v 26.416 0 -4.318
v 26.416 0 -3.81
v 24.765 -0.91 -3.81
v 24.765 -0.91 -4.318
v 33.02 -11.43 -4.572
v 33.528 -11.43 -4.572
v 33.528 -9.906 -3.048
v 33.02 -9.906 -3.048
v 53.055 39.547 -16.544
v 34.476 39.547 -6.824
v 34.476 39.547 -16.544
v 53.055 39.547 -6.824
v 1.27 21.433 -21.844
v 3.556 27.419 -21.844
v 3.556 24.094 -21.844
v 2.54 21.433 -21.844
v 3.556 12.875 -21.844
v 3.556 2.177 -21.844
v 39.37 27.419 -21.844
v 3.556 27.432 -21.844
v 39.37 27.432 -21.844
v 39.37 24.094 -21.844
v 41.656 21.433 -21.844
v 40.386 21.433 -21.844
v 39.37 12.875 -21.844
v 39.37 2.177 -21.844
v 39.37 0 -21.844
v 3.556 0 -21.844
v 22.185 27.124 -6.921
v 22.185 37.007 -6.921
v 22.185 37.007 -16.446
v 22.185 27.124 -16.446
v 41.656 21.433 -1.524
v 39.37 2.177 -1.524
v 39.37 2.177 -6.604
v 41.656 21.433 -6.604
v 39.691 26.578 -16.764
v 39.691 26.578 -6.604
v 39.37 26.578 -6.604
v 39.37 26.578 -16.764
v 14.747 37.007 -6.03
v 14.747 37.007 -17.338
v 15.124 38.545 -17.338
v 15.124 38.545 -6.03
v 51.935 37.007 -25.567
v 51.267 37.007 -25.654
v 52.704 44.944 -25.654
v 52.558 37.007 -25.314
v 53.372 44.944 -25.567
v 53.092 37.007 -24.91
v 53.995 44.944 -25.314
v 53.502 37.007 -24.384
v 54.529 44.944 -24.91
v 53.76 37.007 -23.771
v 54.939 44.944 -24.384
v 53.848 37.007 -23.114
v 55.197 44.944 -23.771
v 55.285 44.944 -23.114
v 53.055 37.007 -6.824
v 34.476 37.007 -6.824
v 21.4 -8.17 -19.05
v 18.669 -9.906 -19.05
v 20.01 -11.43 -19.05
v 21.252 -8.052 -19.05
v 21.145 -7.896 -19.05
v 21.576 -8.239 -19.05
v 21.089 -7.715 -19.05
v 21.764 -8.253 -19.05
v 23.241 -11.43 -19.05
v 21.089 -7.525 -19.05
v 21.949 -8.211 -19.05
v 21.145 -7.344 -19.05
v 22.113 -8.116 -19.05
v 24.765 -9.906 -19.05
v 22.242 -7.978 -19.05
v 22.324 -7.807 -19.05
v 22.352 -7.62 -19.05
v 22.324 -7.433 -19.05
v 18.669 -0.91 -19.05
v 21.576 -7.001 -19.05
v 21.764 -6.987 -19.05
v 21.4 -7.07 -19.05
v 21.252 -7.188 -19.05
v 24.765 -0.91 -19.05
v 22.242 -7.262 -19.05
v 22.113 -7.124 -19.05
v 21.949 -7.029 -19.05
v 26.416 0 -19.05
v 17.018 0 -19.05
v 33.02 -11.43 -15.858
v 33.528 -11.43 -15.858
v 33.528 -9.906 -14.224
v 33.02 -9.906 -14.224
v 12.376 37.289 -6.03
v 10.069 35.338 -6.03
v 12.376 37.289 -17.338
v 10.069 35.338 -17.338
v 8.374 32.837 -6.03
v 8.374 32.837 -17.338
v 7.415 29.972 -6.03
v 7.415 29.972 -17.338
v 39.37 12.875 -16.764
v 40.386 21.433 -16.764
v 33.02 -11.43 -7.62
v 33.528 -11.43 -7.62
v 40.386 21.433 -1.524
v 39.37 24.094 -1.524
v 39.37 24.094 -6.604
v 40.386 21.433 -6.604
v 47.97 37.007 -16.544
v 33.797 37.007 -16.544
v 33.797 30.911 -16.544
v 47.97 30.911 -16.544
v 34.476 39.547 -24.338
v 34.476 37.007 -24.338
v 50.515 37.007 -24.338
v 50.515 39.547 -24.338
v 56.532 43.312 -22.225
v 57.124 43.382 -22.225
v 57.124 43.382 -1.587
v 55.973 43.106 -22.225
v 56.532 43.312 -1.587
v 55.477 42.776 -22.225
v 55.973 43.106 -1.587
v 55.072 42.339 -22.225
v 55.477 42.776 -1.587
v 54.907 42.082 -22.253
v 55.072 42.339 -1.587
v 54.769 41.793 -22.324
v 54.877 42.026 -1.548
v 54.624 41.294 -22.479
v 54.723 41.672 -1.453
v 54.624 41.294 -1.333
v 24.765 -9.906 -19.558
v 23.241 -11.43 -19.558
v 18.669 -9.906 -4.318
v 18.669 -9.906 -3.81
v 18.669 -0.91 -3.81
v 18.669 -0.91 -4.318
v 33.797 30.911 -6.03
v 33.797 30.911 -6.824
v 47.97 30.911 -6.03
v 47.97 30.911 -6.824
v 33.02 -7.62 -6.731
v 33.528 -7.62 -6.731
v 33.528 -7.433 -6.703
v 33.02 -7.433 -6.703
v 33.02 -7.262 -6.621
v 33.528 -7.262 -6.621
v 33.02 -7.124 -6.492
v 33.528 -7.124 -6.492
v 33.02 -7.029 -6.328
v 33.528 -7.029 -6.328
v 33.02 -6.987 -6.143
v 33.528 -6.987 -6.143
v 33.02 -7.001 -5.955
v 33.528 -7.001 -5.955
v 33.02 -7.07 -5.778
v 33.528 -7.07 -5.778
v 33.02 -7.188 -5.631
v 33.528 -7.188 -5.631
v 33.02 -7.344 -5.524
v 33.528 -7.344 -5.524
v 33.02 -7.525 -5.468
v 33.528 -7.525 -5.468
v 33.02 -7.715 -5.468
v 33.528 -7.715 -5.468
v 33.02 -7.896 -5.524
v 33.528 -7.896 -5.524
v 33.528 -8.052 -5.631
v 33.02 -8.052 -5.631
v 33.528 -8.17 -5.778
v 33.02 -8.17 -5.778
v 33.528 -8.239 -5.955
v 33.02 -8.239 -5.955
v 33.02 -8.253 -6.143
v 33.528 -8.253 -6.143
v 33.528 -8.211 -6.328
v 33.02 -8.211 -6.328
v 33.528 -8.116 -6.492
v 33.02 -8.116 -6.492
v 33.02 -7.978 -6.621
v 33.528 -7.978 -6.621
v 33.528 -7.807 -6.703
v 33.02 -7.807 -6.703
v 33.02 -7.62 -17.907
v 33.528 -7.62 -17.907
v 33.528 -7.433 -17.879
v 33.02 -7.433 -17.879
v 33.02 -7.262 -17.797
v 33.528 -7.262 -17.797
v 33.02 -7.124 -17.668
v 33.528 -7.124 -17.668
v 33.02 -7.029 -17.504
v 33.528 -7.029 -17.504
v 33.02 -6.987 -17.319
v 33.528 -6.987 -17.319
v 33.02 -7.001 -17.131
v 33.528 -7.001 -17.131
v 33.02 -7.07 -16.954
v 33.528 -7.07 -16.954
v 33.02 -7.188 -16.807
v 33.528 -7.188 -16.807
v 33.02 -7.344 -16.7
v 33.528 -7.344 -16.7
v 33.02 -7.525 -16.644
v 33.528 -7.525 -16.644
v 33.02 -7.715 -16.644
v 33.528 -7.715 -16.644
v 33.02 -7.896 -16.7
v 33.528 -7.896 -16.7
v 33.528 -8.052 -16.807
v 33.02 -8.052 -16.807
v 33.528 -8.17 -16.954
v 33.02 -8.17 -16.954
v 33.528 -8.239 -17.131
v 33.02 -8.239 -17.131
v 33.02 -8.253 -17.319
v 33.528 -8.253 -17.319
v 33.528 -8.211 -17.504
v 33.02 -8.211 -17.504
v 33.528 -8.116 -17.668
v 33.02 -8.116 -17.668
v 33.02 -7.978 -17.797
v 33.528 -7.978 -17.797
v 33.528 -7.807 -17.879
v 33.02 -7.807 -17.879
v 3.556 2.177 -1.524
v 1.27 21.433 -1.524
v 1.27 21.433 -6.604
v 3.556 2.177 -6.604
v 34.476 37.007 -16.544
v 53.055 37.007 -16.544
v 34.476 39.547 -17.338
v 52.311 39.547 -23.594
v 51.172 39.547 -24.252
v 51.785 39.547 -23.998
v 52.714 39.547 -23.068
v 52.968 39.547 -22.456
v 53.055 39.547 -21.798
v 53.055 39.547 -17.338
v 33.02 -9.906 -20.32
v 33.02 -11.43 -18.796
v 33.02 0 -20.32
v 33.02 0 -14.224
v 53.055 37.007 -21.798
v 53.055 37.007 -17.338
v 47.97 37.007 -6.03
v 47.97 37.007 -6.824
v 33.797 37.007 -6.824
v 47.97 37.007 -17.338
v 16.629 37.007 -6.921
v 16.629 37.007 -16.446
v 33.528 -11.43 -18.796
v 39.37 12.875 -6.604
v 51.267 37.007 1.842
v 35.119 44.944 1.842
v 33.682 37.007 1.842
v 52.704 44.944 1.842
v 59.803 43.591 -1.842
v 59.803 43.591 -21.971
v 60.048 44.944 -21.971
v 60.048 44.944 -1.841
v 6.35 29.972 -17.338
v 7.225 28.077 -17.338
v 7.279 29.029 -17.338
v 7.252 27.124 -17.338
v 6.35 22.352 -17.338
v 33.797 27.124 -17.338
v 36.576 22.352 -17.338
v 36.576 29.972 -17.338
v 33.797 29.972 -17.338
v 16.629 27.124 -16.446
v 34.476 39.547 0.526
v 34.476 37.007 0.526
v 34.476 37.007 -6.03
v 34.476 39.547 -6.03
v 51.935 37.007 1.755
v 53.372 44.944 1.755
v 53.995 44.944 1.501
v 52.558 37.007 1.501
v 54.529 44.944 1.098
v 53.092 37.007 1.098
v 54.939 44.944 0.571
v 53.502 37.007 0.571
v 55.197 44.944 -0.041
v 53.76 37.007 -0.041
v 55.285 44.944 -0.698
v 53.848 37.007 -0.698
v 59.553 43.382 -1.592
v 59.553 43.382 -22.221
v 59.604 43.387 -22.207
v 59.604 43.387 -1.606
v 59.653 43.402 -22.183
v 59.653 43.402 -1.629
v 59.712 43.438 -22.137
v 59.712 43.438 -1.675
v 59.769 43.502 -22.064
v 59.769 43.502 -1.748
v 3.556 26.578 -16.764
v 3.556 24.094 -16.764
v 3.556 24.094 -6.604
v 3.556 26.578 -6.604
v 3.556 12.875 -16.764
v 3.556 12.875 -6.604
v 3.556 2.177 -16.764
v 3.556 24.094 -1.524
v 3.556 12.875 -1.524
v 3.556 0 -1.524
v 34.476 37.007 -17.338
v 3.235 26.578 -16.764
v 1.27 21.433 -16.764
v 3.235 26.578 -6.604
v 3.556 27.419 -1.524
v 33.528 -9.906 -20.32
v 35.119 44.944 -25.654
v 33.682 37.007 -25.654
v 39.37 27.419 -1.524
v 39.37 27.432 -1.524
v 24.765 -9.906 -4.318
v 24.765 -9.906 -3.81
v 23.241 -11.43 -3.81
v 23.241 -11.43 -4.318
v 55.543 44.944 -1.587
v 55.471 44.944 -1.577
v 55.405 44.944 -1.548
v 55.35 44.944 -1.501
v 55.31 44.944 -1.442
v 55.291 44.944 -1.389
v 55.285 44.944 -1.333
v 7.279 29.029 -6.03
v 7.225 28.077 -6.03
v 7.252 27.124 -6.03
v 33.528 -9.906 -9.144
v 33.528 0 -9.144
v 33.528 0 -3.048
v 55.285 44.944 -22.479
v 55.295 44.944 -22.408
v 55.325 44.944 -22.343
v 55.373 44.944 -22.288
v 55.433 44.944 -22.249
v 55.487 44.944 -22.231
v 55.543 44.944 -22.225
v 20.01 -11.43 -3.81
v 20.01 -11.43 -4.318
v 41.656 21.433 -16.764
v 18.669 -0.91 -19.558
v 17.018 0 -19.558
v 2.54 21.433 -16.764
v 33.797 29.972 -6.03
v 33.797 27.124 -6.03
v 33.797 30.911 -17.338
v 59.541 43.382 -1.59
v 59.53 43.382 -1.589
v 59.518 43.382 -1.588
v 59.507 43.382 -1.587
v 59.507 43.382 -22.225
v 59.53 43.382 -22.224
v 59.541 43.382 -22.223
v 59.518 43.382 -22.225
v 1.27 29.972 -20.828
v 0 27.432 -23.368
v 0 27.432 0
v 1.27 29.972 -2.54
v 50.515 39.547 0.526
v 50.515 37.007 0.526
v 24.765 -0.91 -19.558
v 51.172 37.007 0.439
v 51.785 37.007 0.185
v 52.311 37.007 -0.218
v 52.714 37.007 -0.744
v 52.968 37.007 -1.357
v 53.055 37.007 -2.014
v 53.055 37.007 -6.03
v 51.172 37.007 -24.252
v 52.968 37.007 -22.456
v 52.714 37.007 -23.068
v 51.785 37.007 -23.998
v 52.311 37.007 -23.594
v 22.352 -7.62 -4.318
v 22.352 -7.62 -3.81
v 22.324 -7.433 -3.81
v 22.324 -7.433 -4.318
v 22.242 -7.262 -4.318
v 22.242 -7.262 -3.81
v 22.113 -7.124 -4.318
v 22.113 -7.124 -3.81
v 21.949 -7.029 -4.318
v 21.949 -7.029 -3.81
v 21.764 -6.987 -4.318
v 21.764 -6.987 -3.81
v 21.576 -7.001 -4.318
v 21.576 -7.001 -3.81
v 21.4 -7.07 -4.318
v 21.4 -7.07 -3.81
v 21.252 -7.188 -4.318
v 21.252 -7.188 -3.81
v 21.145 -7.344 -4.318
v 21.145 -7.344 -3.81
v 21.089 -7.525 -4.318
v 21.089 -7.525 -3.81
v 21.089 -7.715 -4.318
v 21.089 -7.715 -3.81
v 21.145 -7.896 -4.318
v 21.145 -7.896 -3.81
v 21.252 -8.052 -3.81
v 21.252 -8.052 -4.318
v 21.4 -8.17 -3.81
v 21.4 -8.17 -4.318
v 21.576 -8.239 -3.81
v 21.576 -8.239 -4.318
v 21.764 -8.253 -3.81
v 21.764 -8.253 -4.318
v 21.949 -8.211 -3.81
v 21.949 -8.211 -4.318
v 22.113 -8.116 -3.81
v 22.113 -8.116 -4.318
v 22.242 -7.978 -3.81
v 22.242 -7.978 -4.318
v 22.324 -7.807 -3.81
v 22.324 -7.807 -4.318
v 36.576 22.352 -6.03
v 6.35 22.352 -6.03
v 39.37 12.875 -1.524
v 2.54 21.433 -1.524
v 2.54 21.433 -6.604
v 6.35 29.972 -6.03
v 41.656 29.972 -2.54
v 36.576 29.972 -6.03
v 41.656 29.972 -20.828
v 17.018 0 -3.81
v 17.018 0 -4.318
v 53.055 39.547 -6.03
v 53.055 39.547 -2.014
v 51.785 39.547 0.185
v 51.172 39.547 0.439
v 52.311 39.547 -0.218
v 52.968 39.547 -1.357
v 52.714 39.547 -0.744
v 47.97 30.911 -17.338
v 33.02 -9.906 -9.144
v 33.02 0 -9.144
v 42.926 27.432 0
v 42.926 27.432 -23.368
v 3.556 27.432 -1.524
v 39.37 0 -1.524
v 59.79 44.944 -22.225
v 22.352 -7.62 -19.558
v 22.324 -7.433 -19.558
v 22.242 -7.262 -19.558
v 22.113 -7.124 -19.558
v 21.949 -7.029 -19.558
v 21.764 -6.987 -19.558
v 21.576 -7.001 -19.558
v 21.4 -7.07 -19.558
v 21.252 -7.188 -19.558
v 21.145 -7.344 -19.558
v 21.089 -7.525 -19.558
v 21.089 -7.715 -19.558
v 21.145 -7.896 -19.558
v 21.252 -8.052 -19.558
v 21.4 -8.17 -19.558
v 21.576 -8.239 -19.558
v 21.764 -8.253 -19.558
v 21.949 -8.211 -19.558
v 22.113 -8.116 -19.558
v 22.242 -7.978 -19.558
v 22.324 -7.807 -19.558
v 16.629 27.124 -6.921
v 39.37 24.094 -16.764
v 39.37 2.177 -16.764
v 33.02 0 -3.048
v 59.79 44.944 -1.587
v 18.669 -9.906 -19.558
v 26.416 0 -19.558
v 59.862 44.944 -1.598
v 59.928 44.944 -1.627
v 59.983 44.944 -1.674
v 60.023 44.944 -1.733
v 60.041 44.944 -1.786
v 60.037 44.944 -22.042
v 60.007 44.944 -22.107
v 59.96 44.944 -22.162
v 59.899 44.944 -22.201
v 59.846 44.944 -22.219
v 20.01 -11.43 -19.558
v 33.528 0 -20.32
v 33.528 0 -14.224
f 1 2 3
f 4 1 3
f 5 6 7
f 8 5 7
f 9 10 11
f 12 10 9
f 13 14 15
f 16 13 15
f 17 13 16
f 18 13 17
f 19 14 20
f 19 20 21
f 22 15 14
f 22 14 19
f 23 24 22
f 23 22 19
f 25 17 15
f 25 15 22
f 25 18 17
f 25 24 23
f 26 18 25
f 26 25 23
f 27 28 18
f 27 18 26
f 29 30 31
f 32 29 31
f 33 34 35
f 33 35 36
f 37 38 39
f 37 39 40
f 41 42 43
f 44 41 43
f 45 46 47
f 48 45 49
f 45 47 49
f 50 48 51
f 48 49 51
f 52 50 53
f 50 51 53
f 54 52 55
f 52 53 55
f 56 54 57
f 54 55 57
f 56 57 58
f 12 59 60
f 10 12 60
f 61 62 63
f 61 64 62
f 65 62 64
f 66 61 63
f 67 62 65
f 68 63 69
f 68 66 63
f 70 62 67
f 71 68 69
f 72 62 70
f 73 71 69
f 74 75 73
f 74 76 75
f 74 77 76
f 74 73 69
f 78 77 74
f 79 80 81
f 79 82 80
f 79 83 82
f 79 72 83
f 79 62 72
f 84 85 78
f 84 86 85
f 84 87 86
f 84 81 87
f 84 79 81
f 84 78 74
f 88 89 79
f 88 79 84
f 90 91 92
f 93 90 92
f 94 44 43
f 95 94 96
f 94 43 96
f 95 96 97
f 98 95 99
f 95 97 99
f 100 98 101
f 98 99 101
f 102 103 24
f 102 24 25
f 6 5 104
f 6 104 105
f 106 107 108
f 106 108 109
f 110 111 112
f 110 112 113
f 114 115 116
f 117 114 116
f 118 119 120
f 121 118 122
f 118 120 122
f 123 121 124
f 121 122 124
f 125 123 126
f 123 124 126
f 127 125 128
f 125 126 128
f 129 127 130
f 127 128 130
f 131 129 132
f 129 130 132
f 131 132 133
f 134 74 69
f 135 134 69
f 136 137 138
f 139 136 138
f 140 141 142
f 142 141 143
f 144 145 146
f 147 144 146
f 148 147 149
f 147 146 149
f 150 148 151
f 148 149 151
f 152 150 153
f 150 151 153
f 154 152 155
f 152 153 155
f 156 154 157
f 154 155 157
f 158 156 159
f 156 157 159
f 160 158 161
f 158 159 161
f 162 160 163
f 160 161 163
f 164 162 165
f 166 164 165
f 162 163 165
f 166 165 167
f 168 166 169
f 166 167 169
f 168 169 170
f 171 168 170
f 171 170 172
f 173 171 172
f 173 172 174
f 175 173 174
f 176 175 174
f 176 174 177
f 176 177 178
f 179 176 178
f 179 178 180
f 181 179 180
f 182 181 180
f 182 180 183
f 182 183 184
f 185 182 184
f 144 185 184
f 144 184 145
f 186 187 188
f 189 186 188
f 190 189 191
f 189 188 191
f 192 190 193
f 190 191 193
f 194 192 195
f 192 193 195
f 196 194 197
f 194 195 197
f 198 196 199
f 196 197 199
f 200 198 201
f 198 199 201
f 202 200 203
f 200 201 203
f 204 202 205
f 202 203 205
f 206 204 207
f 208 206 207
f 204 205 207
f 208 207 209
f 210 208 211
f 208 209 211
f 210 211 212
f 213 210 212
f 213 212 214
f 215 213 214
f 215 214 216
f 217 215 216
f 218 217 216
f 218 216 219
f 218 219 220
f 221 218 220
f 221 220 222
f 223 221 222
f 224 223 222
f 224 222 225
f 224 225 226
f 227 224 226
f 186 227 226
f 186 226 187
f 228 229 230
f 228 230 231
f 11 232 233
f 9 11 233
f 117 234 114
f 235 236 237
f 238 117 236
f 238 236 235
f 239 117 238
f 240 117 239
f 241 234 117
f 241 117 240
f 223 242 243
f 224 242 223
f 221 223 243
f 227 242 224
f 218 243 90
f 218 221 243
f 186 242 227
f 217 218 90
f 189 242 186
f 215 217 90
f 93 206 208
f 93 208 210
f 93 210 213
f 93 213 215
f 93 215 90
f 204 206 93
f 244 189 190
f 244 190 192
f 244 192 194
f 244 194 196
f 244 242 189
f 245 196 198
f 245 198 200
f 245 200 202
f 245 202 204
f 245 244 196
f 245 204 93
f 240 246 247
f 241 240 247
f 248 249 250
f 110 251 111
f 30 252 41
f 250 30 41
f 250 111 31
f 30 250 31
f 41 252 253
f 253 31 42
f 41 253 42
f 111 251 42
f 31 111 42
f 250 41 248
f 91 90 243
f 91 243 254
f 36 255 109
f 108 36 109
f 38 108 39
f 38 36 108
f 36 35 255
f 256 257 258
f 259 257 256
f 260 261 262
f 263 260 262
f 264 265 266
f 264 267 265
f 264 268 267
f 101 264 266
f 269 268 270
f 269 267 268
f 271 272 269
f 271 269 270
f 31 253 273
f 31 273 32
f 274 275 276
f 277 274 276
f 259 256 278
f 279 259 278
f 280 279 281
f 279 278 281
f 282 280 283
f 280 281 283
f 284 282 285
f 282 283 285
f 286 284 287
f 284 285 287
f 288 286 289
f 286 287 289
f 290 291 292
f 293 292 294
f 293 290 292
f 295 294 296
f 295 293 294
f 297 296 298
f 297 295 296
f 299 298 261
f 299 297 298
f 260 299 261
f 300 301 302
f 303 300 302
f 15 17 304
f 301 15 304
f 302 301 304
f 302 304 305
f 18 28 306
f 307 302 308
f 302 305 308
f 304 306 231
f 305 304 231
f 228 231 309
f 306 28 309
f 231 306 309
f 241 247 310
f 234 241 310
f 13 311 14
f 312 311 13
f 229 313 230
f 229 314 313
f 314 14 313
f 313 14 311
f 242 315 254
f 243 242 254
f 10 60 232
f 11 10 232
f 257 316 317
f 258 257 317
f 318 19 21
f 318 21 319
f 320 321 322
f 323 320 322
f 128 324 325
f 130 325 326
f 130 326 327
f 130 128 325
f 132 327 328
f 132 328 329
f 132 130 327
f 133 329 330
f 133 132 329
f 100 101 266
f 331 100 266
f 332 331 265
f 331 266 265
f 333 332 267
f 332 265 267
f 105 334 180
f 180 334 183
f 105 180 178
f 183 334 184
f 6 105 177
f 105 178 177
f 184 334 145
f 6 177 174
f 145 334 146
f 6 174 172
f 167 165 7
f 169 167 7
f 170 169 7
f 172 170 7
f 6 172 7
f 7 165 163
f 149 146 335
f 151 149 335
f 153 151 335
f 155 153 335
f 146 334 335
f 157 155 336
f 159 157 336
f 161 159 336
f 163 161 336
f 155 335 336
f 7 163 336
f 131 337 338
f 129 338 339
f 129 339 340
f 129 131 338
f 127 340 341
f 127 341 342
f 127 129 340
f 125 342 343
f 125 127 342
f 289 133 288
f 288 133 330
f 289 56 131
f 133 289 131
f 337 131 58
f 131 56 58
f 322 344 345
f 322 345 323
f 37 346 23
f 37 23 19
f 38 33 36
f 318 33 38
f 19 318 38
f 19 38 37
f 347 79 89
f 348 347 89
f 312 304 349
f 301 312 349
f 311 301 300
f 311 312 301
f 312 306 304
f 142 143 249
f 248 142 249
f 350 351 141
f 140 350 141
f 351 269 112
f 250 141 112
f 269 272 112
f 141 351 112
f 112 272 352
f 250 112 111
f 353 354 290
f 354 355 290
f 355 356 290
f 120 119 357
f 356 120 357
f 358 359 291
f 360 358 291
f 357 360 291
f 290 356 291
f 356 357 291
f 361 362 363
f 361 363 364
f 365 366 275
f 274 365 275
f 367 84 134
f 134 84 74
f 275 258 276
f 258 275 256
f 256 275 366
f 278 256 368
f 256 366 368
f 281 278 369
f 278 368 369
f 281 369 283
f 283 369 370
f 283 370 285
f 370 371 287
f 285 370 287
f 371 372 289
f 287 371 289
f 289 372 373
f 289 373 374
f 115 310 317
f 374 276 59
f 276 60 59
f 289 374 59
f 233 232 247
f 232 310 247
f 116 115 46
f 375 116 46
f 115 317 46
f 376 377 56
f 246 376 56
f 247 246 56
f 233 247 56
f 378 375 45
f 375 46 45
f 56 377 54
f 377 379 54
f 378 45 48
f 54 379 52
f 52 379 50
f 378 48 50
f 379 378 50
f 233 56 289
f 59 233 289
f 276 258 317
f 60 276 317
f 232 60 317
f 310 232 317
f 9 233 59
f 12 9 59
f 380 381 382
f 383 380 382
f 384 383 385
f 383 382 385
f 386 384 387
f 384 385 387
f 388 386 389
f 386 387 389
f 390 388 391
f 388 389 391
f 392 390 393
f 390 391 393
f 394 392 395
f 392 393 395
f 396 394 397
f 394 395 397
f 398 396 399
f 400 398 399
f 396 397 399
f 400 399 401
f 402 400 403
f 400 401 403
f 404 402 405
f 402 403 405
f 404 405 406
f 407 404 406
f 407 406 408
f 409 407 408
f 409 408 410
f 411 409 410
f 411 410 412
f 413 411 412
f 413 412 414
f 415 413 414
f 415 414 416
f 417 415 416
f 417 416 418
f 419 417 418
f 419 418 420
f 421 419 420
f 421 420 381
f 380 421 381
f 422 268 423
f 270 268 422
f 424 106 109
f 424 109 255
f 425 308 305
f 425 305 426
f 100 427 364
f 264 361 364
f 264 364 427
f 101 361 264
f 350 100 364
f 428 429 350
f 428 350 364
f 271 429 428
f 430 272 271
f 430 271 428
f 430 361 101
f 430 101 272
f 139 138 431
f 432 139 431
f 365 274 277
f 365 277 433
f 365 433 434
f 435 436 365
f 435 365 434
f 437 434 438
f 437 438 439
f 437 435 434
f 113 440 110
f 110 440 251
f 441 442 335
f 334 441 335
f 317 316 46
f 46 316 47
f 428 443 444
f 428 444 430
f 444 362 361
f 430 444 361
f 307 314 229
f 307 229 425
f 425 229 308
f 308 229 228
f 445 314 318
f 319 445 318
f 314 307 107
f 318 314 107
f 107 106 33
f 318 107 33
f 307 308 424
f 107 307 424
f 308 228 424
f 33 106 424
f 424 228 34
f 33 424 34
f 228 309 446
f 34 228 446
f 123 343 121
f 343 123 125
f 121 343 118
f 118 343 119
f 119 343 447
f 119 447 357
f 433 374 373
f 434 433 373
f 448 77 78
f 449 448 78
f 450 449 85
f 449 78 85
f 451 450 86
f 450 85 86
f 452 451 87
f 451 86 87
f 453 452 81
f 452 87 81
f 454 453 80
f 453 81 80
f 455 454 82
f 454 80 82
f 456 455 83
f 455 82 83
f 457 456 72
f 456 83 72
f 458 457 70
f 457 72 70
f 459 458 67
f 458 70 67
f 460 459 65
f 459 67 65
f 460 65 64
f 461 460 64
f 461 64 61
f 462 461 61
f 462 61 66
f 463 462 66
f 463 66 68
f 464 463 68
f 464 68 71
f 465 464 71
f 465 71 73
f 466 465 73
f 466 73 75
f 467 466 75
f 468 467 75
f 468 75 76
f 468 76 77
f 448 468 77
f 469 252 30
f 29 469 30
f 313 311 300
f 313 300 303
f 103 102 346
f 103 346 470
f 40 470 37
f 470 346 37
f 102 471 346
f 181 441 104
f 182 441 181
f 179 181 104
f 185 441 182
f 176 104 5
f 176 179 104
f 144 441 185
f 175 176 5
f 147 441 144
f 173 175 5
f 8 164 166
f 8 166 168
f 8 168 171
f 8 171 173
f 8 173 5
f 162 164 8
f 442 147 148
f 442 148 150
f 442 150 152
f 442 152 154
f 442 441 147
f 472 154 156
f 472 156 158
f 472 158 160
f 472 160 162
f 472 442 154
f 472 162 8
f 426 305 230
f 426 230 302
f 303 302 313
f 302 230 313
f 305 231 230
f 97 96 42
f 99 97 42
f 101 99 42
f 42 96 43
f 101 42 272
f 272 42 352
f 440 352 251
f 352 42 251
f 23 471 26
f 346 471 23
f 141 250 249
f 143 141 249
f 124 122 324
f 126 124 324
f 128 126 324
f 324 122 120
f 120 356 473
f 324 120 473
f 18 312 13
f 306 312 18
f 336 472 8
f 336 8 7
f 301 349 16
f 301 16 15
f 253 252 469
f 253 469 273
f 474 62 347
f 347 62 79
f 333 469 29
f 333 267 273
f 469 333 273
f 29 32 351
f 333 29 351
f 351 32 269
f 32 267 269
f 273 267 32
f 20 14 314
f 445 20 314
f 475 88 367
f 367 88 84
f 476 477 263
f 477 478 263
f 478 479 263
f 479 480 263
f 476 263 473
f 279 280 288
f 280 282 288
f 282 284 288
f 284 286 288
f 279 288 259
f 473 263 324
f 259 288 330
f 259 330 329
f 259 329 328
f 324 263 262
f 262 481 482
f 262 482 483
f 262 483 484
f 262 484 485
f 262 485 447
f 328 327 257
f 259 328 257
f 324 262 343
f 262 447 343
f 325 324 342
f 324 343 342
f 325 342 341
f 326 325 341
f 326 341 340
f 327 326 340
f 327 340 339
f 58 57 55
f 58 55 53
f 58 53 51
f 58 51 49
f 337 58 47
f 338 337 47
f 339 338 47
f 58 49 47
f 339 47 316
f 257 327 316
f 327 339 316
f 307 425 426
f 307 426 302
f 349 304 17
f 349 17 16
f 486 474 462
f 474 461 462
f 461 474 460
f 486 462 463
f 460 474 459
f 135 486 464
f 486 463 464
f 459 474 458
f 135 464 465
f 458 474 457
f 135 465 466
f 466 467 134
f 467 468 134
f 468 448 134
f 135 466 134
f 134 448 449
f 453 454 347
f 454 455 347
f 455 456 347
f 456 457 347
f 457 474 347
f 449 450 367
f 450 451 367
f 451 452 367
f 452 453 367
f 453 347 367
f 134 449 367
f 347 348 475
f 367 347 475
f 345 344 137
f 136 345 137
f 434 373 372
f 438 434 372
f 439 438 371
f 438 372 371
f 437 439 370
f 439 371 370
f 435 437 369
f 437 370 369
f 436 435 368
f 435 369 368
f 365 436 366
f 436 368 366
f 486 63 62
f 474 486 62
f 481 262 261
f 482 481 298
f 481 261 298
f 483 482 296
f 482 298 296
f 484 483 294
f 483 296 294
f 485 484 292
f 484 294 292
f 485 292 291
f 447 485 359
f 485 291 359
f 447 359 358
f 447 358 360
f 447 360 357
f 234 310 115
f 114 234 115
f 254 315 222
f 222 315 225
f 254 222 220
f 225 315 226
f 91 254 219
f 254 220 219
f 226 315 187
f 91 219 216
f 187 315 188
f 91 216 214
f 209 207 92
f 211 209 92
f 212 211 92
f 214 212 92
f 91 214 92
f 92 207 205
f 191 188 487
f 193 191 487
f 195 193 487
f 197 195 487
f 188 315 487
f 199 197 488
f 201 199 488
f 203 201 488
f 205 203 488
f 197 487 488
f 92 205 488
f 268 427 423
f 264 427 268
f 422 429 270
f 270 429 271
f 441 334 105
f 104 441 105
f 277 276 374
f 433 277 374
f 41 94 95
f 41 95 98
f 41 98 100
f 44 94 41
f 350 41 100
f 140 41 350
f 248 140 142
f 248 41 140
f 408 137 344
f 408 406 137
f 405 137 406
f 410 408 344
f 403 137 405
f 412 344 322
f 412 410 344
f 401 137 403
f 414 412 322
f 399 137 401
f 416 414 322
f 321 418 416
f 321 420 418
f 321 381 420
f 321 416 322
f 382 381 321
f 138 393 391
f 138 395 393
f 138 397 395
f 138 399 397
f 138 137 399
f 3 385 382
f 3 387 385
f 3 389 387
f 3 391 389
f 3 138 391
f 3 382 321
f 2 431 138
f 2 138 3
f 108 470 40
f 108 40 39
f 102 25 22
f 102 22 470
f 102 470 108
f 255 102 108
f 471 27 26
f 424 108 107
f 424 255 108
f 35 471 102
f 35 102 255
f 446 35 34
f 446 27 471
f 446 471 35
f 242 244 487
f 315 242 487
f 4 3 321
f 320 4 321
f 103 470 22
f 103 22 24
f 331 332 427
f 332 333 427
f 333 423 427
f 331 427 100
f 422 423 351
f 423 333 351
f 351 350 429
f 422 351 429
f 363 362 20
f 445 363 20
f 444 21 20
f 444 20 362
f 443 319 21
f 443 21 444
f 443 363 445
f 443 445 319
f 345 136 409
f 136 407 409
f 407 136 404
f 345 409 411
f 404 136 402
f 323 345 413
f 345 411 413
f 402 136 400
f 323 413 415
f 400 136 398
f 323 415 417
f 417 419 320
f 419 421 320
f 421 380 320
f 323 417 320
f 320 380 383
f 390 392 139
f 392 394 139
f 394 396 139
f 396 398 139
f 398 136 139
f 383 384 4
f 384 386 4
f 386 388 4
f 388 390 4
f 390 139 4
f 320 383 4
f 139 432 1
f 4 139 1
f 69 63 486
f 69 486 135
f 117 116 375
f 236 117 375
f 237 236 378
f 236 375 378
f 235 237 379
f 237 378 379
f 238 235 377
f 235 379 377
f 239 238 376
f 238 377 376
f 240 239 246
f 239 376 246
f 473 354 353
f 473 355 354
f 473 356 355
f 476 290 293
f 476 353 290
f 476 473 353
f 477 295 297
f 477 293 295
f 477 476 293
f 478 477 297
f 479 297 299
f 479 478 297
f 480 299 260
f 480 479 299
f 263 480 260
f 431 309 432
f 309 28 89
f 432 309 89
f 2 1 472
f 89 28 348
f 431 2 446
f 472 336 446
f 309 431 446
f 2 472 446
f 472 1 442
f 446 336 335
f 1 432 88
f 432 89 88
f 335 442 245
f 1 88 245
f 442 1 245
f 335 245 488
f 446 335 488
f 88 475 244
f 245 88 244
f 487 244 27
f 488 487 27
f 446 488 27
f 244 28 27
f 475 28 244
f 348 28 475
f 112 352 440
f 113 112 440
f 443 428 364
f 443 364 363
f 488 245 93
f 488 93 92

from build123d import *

# Parameters (mm, degrees)
SKETCH1_W                = 42.926
SKETCH1_H                = 23.368
BOSS_EXTRUDE1_DEPTH      = 29.972
SKETCH2_W                = 42.926
SKETCH2_H                = 23.368
SKETCH2_W_2              = 35.814
SKETCH2_H_2              = 20.32
CUT_EXTRUDE1_DEPTH       = 27.432
CUT_EXTRUDE3_DEPTH       = 58.332588325
CUT_EXTRUDE4_DEPTH       = 58.332588325
SKETCH6_W                = 30.226
SKETCH6_H                = 11.308118352
CUT_EXTRUDE5_DEPTH       = 7.62
BOSS_EXTRUDE2_DEPTH      = 20.32
SKETCH9_W                = 9.398
SKETCH9_H                = 0.508
SKETCH9_W_2              = 0.508
SKETCH9_H_2              = 6.096
BOSS_EXTRUDE3_DEPTH      = 11.43
CUT_EXTRUDE6_REACH       = 52.68
SKETCH10_R               = 0.635
SKETCH11_R               = 0.635
CUT_EXTRUDE7_DEPTH       = 56.888081234
BOSS_EXTRUDE7_DEPTH      = 11.308118351
CUT_EXTRUDE8_REACH       = 74.758
SKETCH13_W               = 10.16
SKETCH13_H               = 24.400758564
SKETCH14_W               = 10.16
SKETCH14_H               = 24.400758564
CUT_EXTRUDE9_DEPTH       = 12.7
BOSS_EXTRUDE8_DEPTH      = 1.8415
BOSS_EXTRUDE8_DEPTH_BACK = 25.654
SKETCH17_W               = 3.429
SKETCH17_H               = 2.254926229
SKETCH17_H_2             = 1.5875
CUT_EXTRUDE11_DEPTH      = 4.686333783
FILLET2_R                = 2.54
FILLET3_R                = 2.54
FILLET6_R                = 0.254
CUT_EXTRUDE12_START      = -6.096
CUT_EXTRUDE12_OUTLINE_W  = 14.172661673
CUT_EXTRUDE12_OUTLINE_H  = 9.720618352
CUT_EXTRUDE12_DEPTH      = 6.096
CUT_EXTRUDE13_DEPTH      = 2.54
SKETCH20_W               = 5.55625
SKETCH20_H               = 9.525
CUT_EXTRUDE14_DEPTH      = 12.7


# Read off the part's stored shape, not the designer's step: Cut-Extrude12
with BuildPart() as part:
    # Sketch1 → Boss-Extrude1 (new body)
    with BuildSketch(Plane(origin=(0, 0, 0), x_dir=(1, 0, 0), z_dir=(0, 1, 0))):
        with Locations((21.463, 11.684)):
            Rectangle(SKETCH1_W, SKETCH1_H)
    extrude(amount=BOSS_EXTRUDE1_DEPTH)

    # Sketch2 → Cut-Extrude1 (cut)
    with BuildSketch(Plane.XZ):
        with Locations((21.463, -11.684)):
            Rectangle(SKETCH2_W, SKETCH2_H)
        with Locations((21.463, -11.684)):
            Rectangle(SKETCH2_W_2, SKETCH2_H_2, mode=Mode.SUBTRACT)
    extrude(amount=-CUT_EXTRUDE1_DEPTH, mode=Mode.SUBTRACT)

    # Sketch5 → Cut-Extrude3 (cut, through all)
    with BuildSketch(Plane.XY):
        Polygon((0, 29.972), (0, 27.432), (1.27, 29.972), align=None)
        Polygon((42.926, 29.972), (42.926, 27.432), (41.656, 29.972), align=None)
    extrude(amount=-CUT_EXTRUDE3_DEPTH, mode=Mode.SUBTRACT)

    # Sketch3 → Cut-Extrude4 (cut, through all)
    with BuildSketch(Plane.ZY):
        Polygon((-23.368, 27.432), (-20.828, 29.972), (-23.368, 29.972), align=None)
        Polygon((0, 27.432), (0, 29.972), (-2.54, 29.972), align=None)
    extrude(amount=-CUT_EXTRUDE4_DEPTH, mode=Mode.SUBTRACT)

    # Sketch6 → Cut-Extrude5 (cut)
    with BuildSketch(Plane(origin=(0, 29.972, 0), x_dir=(1, 0, 0), z_dir=(0, 1, 0))):
        with Locations((21.463, 11.684)):
            Rectangle(SKETCH6_W, SKETCH6_H)
    extrude(amount=-CUT_EXTRUDE5_DEPTH, mode=Mode.SUBTRACT)

    # Sketch7 → Boss-Extrude2 (add)
    with BuildSketch(Plane.XY.offset(-1.524)):
        Polygon((3.556, 12.874989672), (2.54, 21.433276772), (1.27, 21.433276772), (3.556, 2.177130797), align=None)
        Polygon((2.54, 21.433276772), (3.556, 24.093595202), (3.556, 27.418993238), (1.27, 21.433276772), align=None)
        Polygon((39.37, 2.177130797), (41.656, 21.433276772), (40.386, 21.433276772), (39.37, 12.874989672), align=None)
        Polygon((41.656, 21.433276772), (39.37, 27.418993238), (39.37, 24.093595202), (40.386, 21.433276772), align=None)
    extrude(amount=-BOSS_EXTRUDE2_DEPTH)

    # Sketch9 → Boss-Extrude3 (add)
    with BuildSketch(Plane.XZ):
        with Locations((21.717, -19.304)):
            Rectangle(SKETCH9_W, SKETCH9_H)
        with Locations((21.717, -4.064)):
            Rectangle(SKETCH9_W, SKETCH9_H)
        with Locations((33.274, -6.096)):
            Rectangle(SKETCH9_W_2, SKETCH9_H_2)
        with Locations((33.274, -17.272)):
            Rectangle(SKETCH9_W_2, SKETCH9_H_2)
    extrude(amount=BOSS_EXTRUDE3_DEPTH)

    # Sketch10 → Cut-Extrude6 (cut, up to next)
    with BuildSketch(Plane(origin=(33.528, 0, 0), x_dir=(0, 0, -1), z_dir=(1, 0, 0)), mode=Mode.PRIVATE) as cut_extrude6_sk1:
        Polygon((18.796, -11.43), (20.32, -11.43), (20.32, -9.906), align=None)
    cut_extrude6_tool1 = extrude(cut_extrude6_sk1.sketch, amount=-CUT_EXTRUDE6_REACH, mode=Mode.PRIVATE) & part.part
    # Sketch10 → Cut-Extrude6 (cut, up to next)
    with BuildSketch(Plane(origin=(33.528, 0, 0), x_dir=(0, 0, -1), z_dir=(1, 0, 0)), mode=Mode.PRIVATE) as cut_extrude6_sk2:
        Polygon((14.224, -9.906), (14.224, -11.43), (15.857916608, -11.43), align=None)
    cut_extrude6_tool2 = extrude(cut_extrude6_sk2.sketch, amount=-CUT_EXTRUDE6_REACH, mode=Mode.PRIVATE) & part.part
    # Sketch10 → Cut-Extrude6 (cut, up to next)
    with BuildSketch(Plane(origin=(33.528, 0, 0), x_dir=(0, 0, -1), z_dir=(1, 0, 0)), mode=Mode.PRIVATE) as cut_extrude6_sk3:
        Polygon((3.048, -9.906), (3.048, -11.43), (4.572, -11.43), align=None)
    cut_extrude6_tool3 = extrude(cut_extrude6_sk3.sketch, amount=-CUT_EXTRUDE6_REACH, mode=Mode.PRIVATE) & part.part
    # Sketch10 → Cut-Extrude6 (cut, up to next)
    with BuildSketch(Plane(origin=(33.528, 0, 0), x_dir=(0, 0, -1), z_dir=(1, 0, 0)), mode=Mode.PRIVATE) as cut_extrude6_sk4:
        Polygon((7.62, -11.43), (9.144, -11.43), (9.144, -9.906), align=None)
    cut_extrude6_tool4 = extrude(cut_extrude6_sk4.sketch, amount=-CUT_EXTRUDE6_REACH, mode=Mode.PRIVATE) & part.part
    # Sketch10 → Cut-Extrude6 (cut, up to next)
    with BuildSketch(Plane(origin=(33.528, 0, 0), x_dir=(0, 0, -1), z_dir=(1, 0, 0)), mode=Mode.PRIVATE) as cut_extrude6_sk5:
        with Locations((6.096, -7.62)):
            Circle(SKETCH10_R)
    cut_extrude6_tool5 = extrude(cut_extrude6_sk5.sketch, amount=-CUT_EXTRUDE6_REACH, mode=Mode.PRIVATE) & part.part
    # Sketch10 → Cut-Extrude6 (cut, up to next)
    with BuildSketch(Plane(origin=(33.528, 0, 0), x_dir=(0, 0, -1), z_dir=(1, 0, 0)), mode=Mode.PRIVATE) as cut_extrude6_sk6:
        with Locations((17.272, -7.62)):
            Circle(SKETCH10_R)
    cut_extrude6_tool6 = extrude(cut_extrude6_sk6.sketch, amount=-CUT_EXTRUDE6_REACH, mode=Mode.PRIVATE) & part.part
    add(cut_extrude6_tool1.solids().sort_by_distance((33.528, -10.922, -19.812))[0], mode=Mode.SUBTRACT)
    add(cut_extrude6_tool2.solids().sort_by_distance((33.528, -10.922, -14.768639))[0], mode=Mode.SUBTRACT)
    add(cut_extrude6_tool3.solids().sort_by_distance((33.528, -10.922, -3.556))[0], mode=Mode.SUBTRACT)
    add(cut_extrude6_tool4.solids().sort_by_distance((33.528, -10.922, -8.636))[0], mode=Mode.SUBTRACT)
    add(cut_extrude6_tool5.solids().sort_by_distance((33.528, -7.62, -6.096))[0], mode=Mode.SUBTRACT)
    add(cut_extrude6_tool6.solids().sort_by_distance((33.528, -7.62, -17.272))[0], mode=Mode.SUBTRACT)

    # Sketch11 → Cut-Extrude7 (cut, through all)
    with BuildSketch(Plane.XY.offset(-3.81)):
        Polygon((18.669, -0.909958284), (17.018, 0), (17.018, -11.43), (20.009868608, -11.43), (18.669, -9.906), align=None)
        with Locations((21.717, -7.62)):
            Circle(SKETCH11_R)
        Polygon((26.416, 0), (24.765, -0.909958284), (24.765, -9.906), (23.241, -11.43), (26.416, -11.43), align=None)
    extrude(amount=-CUT_EXTRUDE7_DEPTH, mode=Mode.SUBTRACT)

    # Sketch12 → Boss-Extrude7 (add)
    with BuildSketch(Plane.XY.offset(-17.338059176)):
        with BuildLine():
            Line((33.796840653, 30.910566615), (47.969502326, 30.910566615))
            Line((47.969502326, 30.910566615), (47.969502326, 37.006566615))
            Line((47.969502326, 37.006566615), (14.747400659, 37.006566615))
            Line((14.747400659, 37.006566615), (15.124125013, 38.544832274))
            ThreePointArc((15.124125013, 38.544832274), (10.069226718, 35.337937954), (7.415384629, 29.972))
            Line((7.415384629, 29.972), (33.796840653, 29.972))
            Line((33.796840653, 29.972), (33.796840653, 30.910566615))
        make_face()
        with BuildLine():
            Line((33.796840653, 27.124411179), (33.796840653, 29.972))
            Line((33.796840653, 29.972), (7.415384629, 29.972))
            ThreePointArc((7.415384629, 29.972), (7.241769578, 28.553480232), (7.251876855, 27.124411179))
            Line((7.251876855, 27.124411179), (33.796840653, 27.124411179))
        make_face()
    extrude(amount=BOSS_EXTRUDE7_DEPTH)

    # Cut-Extrude8: up to this face of the body (flat: up to its plane)
    cut_extrude8_end = Plane(part.part.faces().sort_by_distance((3.556, 1.088565398, -11.684))[0])
    # Sketch13 → Cut-Extrude8 (cut, up to the picked face)
    with BuildSketch(Plane.ZY.offset(9.144), mode=Mode.PRIVATE) as cut_extrude8_sk1:
        with Locations((-11.684, 14.377510079)):
            Rectangle(SKETCH13_W, SKETCH13_H)
    cut_extrude8_tool1 = split(extrude(cut_extrude8_sk1.sketch, amount=-CUT_EXTRUDE8_REACH, mode=Mode.PRIVATE), bisect_by=cut_extrude8_end, keep=Keep.BOTH, mode=Mode.PRIVATE)
    add(cut_extrude8_tool1.solids().sort_by(Axis((-9.144, 14.37751, -11.684), (1, 0, 0)))[0], mode=Mode.SUBTRACT)

    # Sketch14 → Cut-Extrude9 (cut)
    with BuildSketch(Plane(origin=(52.07, 0, 0), x_dir=(0, 0, -1), z_dir=(1, 0, 0))):
        with Locations((11.684, 14.377510079)):
            Rectangle(SKETCH14_W, SKETCH14_H)
    extrude(amount=-CUT_EXTRUDE9_DEPTH, mode=Mode.SUBTRACT)

    # Cut-Extrude12 outline → Cut-Extrude12 (cut)
    with BuildSketch(Plane.XZ.offset(-30.910566615).offset(CUT_EXTRUDE12_START)):
        with Locations((40.88317149, -11.684)):
            Rectangle(CUT_EXTRUDE12_OUTLINE_W, CUT_EXTRUDE12_OUTLINE_H)
    extrude(amount=CUT_EXTRUDE12_DEPTH, mode=Mode.SUBTRACT)

    # Sketch20 → Cut-Extrude14 (cut)
    with BuildSketch(Plane(origin=(0, 37.006566615, 0), x_dir=(1, 0, 0), z_dir=(0, 1, 0))):
        with Locations((19.406889706, 11.684)):
            Rectangle(SKETCH20_W, SKETCH20_H)
    extrude(amount=-CUT_EXTRUDE14_DEPTH, mode=Mode.SUBTRACT)


with BuildPart() as body_2:
    # Sketch15 → Boss-Extrude8 (new, two sides: drawn at the far end of the back side and taken through both)
    with BuildSketch(Plane.XY.offset(-BOSS_EXTRUDE8_DEPTH_BACK)):
        Polygon((33.682002326, 37.006566615), (47.969502326, 37.006566615), (53.848269551, 37.006566615), (55.002370372, 43.381955354), (55.285150601, 44.944066615), (35.118883377, 44.944066615), align=None)
        Polygon((55.285150601, 44.944066615), (55.002370372, 43.381955354), (59.764870372, 43.381955354), (60.047650601, 44.944066615), align=None)
    extrude(amount=BOSS_EXTRUDE8_DEPTH + BOSS_EXTRUDE8_DEPTH_BACK)

    # Sketch17 → Cut-Extrude11 (cut)
    with BuildSketch(Plane(origin=(50.264518988, -9.099103601, 0), x_dir=(0, 0, -1), z_dir=(0.9840070935891015, -0.17812927824007313, 0))):
        with Locations((-0.127, 52.206561912)):
            Rectangle(SKETCH17_W, SKETCH17_H)
        with Locations((-0.127, 54.127775026)):
            Rectangle(SKETCH17_W, SKETCH17_H_2)
        with Locations((23.9395, 52.206561912)):
            Rectangle(SKETCH17_W, SKETCH17_H)
        with Locations((23.9395, 54.127775026)):
            Rectangle(SKETCH17_W, SKETCH17_H_2)
    extrude(amount=-CUT_EXTRUDE11_DEPTH, mode=Mode.SUBTRACT)

    # Fillet2
    fillet2_edges = [body_2.edges().sort_by_distance(p)[0] for p in [
        (54.425319961, 40.194260985, 1.8415),
        (54.425319961, 40.194260985, -25.654),
    ]]
    fillet(fillet2_edges, radius=FILLET2_R)

    # Fillet3
    fillet3_edges = [body_2.edges().sort_by_distance(p)[0] for p in [
        (55.002370372, 43.381955354, -11.90625),
    ]]
    fillet(fillet3_edges, radius=FILLET3_R)

    # Fillet6
    fillet6_edges = [body_2.edges().sort_by_distance(p)[0] for p in [
        (59.764870372, 43.381955354, -11.90625),
        (59.906260486, 44.163010985, -1.5875),
        (54.813421497, 42.338179537, -1.5875),
        (59.906260486, 44.163010985, -22.225),
        (54.813421497, 42.338179537, -22.225),
    ]]
    fillet(fillet6_edges, radius=FILLET6_R)

    # Sketch19 → Cut-Extrude13 (cut)
    with BuildSketch(Plane.XZ.offset(-37.006566615)):
        with BuildLine():
            Line((34.475752326, 0.525663982), (34.475752326, -6.029940824))
            Line((34.475752326, -6.029940824), (47.969502326, -6.029940824))
            Line((47.969502326, -6.029940824), (53.054519551, -6.029940824))
            Line((53.054519551, -6.029940824), (53.054519551, -2.014336018))
            ThreePointArc((53.054519551, -2.014336018), (52.310570775, -0.218284794), (50.514519551, 0.525663982))
            Line((50.514519551, 0.525663982), (34.475752326, 0.525663982))
        make_face()
        Polygon((47.969502326, -6.823690824), (34.475752326, -6.823690824), (34.475752326, -16.544309176), (47.969502326, -16.544309176), (53.054519551, -16.544309176), (53.054519551, -6.823690824), align=None)
        with BuildLine():
            Line((47.969502326, -17.338059176), (34.475752326, -17.338059176))
            Line((34.475752326, -17.338059176), (34.475752326, -24.338163982))
            Line((34.475752326, -24.338163982), (50.514519551, -24.338163982))
            ThreePointArc((50.514519551, -24.338163982), (52.310570775, -23.594215206), (53.054519551, -21.798163982))
            Line((53.054519551, -21.798163982), (53.054519551, -17.338059176))
            Line((53.054519551, -17.338059176), (47.969502326, -17.338059176))
        make_face()
    extrude(amount=-CUT_EXTRUDE13_DEPTH, mode=Mode.SUBTRACT)


solid = Compound([part.part, body_2.part])
